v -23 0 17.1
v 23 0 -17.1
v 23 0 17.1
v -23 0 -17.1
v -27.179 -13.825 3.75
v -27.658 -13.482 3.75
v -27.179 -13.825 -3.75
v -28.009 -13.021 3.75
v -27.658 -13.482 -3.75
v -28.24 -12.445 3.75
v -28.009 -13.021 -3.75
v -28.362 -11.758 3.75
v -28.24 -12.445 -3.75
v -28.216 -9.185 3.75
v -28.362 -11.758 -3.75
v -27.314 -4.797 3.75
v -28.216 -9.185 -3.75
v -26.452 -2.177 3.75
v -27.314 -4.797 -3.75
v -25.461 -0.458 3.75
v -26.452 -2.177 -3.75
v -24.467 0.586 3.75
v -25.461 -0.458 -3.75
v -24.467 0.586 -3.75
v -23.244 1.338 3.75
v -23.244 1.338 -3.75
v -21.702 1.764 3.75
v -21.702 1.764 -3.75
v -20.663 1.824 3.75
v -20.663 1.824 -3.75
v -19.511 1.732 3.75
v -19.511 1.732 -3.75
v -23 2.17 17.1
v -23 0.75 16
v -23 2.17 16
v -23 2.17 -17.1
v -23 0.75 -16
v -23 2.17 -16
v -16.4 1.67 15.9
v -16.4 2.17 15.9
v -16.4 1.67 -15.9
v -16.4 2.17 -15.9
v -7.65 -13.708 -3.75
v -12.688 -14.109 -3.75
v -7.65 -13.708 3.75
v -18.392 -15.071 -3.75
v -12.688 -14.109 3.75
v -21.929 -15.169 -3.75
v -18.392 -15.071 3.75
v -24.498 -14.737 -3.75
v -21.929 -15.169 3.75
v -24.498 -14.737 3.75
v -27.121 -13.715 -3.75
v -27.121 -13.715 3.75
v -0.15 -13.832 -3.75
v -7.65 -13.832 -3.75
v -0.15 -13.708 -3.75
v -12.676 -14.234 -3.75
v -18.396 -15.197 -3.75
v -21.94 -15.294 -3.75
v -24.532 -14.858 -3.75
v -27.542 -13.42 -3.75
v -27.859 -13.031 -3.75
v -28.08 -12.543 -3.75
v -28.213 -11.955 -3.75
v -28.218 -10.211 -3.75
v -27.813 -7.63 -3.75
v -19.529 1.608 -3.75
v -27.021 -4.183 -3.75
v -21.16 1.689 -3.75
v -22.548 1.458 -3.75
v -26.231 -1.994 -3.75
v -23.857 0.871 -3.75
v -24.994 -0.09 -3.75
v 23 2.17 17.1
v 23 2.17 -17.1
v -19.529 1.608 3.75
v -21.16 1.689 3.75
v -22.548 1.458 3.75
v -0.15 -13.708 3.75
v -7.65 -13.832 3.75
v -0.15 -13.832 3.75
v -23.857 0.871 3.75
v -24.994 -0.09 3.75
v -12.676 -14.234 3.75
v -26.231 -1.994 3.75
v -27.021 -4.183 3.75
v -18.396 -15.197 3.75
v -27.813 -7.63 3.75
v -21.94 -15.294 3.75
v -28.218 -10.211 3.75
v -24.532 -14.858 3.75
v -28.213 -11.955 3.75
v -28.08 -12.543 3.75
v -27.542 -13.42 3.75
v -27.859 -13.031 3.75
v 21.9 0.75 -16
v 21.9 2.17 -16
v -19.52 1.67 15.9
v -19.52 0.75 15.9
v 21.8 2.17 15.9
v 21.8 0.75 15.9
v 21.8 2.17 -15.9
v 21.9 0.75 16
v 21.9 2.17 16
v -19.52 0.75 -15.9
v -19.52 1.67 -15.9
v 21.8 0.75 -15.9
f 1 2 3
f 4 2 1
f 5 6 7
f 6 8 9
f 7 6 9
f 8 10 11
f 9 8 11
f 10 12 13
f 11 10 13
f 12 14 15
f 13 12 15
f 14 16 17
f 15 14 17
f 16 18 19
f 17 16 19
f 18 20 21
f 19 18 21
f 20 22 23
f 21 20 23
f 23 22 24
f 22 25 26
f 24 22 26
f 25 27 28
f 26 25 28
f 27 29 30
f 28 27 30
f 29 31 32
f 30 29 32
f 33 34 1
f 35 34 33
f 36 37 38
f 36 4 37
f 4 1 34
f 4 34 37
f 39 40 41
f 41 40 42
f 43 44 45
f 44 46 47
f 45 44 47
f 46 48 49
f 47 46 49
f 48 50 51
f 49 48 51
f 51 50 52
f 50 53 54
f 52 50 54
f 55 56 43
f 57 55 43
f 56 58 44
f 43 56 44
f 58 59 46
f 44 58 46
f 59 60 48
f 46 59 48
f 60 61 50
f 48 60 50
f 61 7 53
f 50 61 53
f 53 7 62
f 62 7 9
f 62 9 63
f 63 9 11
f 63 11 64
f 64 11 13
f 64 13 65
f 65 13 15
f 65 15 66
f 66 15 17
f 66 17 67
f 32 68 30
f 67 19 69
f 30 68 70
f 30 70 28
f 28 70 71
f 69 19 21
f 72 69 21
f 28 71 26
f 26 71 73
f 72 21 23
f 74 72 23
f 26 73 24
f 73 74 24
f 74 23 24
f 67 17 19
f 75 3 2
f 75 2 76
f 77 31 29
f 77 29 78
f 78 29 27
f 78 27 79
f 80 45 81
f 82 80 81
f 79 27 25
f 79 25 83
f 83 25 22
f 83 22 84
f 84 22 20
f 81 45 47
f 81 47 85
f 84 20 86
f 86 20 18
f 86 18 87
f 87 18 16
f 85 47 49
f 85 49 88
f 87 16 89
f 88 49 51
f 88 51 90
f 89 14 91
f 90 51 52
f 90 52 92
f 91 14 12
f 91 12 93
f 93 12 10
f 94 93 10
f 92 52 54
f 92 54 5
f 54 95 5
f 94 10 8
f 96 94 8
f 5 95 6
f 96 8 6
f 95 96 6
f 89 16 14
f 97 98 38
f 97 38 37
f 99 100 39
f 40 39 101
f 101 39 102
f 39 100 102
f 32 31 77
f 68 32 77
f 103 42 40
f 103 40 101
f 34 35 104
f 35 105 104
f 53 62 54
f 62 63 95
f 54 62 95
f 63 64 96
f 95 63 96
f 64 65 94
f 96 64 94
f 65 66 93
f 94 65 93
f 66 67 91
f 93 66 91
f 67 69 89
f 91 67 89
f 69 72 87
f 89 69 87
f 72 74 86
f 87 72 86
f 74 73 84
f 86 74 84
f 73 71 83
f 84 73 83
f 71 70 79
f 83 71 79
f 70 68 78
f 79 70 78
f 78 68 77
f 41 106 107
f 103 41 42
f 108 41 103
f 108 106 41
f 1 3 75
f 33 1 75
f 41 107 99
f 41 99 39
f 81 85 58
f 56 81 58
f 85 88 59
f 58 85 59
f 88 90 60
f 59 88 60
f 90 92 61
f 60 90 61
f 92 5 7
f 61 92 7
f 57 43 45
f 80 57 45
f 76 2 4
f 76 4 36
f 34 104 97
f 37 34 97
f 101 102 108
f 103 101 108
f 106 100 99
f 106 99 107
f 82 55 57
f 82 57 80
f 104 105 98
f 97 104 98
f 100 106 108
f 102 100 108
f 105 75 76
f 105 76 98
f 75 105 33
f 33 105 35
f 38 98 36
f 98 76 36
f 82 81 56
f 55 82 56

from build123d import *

# Parameters (mm, degrees)
SKETCH1_W           = 45.8
SKETCH1_H           = 34
BOSS_EXTRUDE1_DEPTH = 2.17
SKETCH2_W           = 44.8
SKETCH2_H           = 32
CUT_EXTRUDE1_DEPTH  = 1.42
SKETCH3_W           = 41.32
SKETCH3_H           = 31.8
BOSS_EXTRUDE3_DEPTH = 1.42
SKETCH10_W          = 3.12
SKETCH10_H          = 31.8
CUT_EXTRUDE2_DEPTH  = 0.5
SKETCH6_W           = 7.5
SKETCH6_H           = 0.125
MOVE_FACE1_BY       = 0.1
MOVE_FACE1_2_BY     = 0.1
MOVE_FACE1_3_BY     = 0.1
MOVE_FACE1_4_BY     = 0.1


with BuildPart() as part:
    # Sketch1 → Boss-Extrude1 (new body)
    with BuildSketch(Plane(origin=(0, 0, 0), x_dir=(1, 0, 0), z_dir=(0, 1, 0))):
        Rectangle(SKETCH1_W, SKETCH1_H)
    extrude(amount=BOSS_EXTRUDE1_DEPTH)

    # Sketch2 → Cut-Extrude1 (cut)
    with BuildSketch(Plane(origin=(0, 2.17, 0), x_dir=(1, 0, 0), z_dir=(0, 1, 0))):
        with Locations((-0.5, 0)):
            Rectangle(SKETCH2_W, SKETCH2_H)
    extrude(amount=-CUT_EXTRUDE1_DEPTH, mode=Mode.SUBTRACT)

    # Move Face1: a face moved outward by 0.1
    extrude(part.faces().sort_by_distance((-22.9, 0.483729711, 0))[0], amount=MOVE_FACE1_BY, dir=(-1, 0, 0))

    # Move Face1 2: a face moved outward by 0.1
    extrude(part.faces().sort_by_distance((0, 1.085, -17))[0], amount=MOVE_FACE1_2_BY, dir=(0, 0, -1))

    # Move Face1 3: a face moved outward by 0.1
    extrude(part.faces().sort_by_distance((22.9, 1.085, 0))[0], amount=MOVE_FACE1_3_BY, dir=(1, 0, 0))

    # Move Face1 4: a face moved outward by 0.1
    extrude(part.faces().sort_by_distance((0, 1.085, 17))[0], amount=MOVE_FACE1_4_BY, dir=(0, 0, 1))


with BuildPart() as body_2:
    # Sketch3 → Boss-Extrude3 (new body)
    with BuildSketch(Plane(origin=(0, 0.75, 0), x_dir=(1, 0, 0), z_dir=(0, 1, 0))):
        with Locations((1.14, 0)):
            Rectangle(SKETCH3_W, SKETCH3_H)
    extrude(amount=BOSS_EXTRUDE3_DEPTH)

    # Sketch10 → Cut-Extrude2 (cut)
    with BuildSketch(Plane(origin=(0, 2.17, 0), x_dir=(1, 0, 0), z_dir=(0, 1, 0))):
        with Locations((-17.96, 0)):
            Rectangle(SKETCH10_W, SKETCH10_H)
    extrude(amount=-CUT_EXTRUDE2_DEPTH, mode=Mode.SUBTRACT)


with BuildPart() as body_3:
    # Sweep1: sweep along a path in Sketch5
    with BuildLine() as sweep1_path:  # in the path sketch's own coordinates; laid on its plane below (add() does not lay a ready-made edge on the line's plane)
        Line((-0.150030463, -13.77), (-7.650030463, -13.77))
        add(Edge.make_bspline(
            [(-7.650030463, -13.77), (-11.191284234, -13.77), (-16.452701483, -15.032914926), (-23.188655813, -15.825499155), (-27.150030463, -13.77)],
            knots=[0, 0, 0, 0, 0.425975672, 1, 1, 1, 1], degree=3))
        add(Edge.make_bspline(
            [(-27.150030463, -13.77), (-28.801890413, -12.91287412), (-28.41126063, -9.69743297), (-26.311115961, -0.725614859), (-23.47041501, 2.232100695), (-19.52, 1.67)],
            knots=[0, 0, 0, 0, 0.519171968, 0.661296858, 1, 1, 1, 1], degree=3))
    # Sketch6 → Sweep1 (sweep)
    with BuildSketch(Plane(origin=(-0.150030463, 0, 0), x_dir=(0, 0, -1), z_dir=(1, 0, 0))):
        with Locations((0, -13.77)):
            Rectangle(SKETCH6_W, SKETCH6_H)
    sweep(path=Plane.XY * sweep1_path.line)


solid = Compound([part.part, body_2.part, body_3.part])
